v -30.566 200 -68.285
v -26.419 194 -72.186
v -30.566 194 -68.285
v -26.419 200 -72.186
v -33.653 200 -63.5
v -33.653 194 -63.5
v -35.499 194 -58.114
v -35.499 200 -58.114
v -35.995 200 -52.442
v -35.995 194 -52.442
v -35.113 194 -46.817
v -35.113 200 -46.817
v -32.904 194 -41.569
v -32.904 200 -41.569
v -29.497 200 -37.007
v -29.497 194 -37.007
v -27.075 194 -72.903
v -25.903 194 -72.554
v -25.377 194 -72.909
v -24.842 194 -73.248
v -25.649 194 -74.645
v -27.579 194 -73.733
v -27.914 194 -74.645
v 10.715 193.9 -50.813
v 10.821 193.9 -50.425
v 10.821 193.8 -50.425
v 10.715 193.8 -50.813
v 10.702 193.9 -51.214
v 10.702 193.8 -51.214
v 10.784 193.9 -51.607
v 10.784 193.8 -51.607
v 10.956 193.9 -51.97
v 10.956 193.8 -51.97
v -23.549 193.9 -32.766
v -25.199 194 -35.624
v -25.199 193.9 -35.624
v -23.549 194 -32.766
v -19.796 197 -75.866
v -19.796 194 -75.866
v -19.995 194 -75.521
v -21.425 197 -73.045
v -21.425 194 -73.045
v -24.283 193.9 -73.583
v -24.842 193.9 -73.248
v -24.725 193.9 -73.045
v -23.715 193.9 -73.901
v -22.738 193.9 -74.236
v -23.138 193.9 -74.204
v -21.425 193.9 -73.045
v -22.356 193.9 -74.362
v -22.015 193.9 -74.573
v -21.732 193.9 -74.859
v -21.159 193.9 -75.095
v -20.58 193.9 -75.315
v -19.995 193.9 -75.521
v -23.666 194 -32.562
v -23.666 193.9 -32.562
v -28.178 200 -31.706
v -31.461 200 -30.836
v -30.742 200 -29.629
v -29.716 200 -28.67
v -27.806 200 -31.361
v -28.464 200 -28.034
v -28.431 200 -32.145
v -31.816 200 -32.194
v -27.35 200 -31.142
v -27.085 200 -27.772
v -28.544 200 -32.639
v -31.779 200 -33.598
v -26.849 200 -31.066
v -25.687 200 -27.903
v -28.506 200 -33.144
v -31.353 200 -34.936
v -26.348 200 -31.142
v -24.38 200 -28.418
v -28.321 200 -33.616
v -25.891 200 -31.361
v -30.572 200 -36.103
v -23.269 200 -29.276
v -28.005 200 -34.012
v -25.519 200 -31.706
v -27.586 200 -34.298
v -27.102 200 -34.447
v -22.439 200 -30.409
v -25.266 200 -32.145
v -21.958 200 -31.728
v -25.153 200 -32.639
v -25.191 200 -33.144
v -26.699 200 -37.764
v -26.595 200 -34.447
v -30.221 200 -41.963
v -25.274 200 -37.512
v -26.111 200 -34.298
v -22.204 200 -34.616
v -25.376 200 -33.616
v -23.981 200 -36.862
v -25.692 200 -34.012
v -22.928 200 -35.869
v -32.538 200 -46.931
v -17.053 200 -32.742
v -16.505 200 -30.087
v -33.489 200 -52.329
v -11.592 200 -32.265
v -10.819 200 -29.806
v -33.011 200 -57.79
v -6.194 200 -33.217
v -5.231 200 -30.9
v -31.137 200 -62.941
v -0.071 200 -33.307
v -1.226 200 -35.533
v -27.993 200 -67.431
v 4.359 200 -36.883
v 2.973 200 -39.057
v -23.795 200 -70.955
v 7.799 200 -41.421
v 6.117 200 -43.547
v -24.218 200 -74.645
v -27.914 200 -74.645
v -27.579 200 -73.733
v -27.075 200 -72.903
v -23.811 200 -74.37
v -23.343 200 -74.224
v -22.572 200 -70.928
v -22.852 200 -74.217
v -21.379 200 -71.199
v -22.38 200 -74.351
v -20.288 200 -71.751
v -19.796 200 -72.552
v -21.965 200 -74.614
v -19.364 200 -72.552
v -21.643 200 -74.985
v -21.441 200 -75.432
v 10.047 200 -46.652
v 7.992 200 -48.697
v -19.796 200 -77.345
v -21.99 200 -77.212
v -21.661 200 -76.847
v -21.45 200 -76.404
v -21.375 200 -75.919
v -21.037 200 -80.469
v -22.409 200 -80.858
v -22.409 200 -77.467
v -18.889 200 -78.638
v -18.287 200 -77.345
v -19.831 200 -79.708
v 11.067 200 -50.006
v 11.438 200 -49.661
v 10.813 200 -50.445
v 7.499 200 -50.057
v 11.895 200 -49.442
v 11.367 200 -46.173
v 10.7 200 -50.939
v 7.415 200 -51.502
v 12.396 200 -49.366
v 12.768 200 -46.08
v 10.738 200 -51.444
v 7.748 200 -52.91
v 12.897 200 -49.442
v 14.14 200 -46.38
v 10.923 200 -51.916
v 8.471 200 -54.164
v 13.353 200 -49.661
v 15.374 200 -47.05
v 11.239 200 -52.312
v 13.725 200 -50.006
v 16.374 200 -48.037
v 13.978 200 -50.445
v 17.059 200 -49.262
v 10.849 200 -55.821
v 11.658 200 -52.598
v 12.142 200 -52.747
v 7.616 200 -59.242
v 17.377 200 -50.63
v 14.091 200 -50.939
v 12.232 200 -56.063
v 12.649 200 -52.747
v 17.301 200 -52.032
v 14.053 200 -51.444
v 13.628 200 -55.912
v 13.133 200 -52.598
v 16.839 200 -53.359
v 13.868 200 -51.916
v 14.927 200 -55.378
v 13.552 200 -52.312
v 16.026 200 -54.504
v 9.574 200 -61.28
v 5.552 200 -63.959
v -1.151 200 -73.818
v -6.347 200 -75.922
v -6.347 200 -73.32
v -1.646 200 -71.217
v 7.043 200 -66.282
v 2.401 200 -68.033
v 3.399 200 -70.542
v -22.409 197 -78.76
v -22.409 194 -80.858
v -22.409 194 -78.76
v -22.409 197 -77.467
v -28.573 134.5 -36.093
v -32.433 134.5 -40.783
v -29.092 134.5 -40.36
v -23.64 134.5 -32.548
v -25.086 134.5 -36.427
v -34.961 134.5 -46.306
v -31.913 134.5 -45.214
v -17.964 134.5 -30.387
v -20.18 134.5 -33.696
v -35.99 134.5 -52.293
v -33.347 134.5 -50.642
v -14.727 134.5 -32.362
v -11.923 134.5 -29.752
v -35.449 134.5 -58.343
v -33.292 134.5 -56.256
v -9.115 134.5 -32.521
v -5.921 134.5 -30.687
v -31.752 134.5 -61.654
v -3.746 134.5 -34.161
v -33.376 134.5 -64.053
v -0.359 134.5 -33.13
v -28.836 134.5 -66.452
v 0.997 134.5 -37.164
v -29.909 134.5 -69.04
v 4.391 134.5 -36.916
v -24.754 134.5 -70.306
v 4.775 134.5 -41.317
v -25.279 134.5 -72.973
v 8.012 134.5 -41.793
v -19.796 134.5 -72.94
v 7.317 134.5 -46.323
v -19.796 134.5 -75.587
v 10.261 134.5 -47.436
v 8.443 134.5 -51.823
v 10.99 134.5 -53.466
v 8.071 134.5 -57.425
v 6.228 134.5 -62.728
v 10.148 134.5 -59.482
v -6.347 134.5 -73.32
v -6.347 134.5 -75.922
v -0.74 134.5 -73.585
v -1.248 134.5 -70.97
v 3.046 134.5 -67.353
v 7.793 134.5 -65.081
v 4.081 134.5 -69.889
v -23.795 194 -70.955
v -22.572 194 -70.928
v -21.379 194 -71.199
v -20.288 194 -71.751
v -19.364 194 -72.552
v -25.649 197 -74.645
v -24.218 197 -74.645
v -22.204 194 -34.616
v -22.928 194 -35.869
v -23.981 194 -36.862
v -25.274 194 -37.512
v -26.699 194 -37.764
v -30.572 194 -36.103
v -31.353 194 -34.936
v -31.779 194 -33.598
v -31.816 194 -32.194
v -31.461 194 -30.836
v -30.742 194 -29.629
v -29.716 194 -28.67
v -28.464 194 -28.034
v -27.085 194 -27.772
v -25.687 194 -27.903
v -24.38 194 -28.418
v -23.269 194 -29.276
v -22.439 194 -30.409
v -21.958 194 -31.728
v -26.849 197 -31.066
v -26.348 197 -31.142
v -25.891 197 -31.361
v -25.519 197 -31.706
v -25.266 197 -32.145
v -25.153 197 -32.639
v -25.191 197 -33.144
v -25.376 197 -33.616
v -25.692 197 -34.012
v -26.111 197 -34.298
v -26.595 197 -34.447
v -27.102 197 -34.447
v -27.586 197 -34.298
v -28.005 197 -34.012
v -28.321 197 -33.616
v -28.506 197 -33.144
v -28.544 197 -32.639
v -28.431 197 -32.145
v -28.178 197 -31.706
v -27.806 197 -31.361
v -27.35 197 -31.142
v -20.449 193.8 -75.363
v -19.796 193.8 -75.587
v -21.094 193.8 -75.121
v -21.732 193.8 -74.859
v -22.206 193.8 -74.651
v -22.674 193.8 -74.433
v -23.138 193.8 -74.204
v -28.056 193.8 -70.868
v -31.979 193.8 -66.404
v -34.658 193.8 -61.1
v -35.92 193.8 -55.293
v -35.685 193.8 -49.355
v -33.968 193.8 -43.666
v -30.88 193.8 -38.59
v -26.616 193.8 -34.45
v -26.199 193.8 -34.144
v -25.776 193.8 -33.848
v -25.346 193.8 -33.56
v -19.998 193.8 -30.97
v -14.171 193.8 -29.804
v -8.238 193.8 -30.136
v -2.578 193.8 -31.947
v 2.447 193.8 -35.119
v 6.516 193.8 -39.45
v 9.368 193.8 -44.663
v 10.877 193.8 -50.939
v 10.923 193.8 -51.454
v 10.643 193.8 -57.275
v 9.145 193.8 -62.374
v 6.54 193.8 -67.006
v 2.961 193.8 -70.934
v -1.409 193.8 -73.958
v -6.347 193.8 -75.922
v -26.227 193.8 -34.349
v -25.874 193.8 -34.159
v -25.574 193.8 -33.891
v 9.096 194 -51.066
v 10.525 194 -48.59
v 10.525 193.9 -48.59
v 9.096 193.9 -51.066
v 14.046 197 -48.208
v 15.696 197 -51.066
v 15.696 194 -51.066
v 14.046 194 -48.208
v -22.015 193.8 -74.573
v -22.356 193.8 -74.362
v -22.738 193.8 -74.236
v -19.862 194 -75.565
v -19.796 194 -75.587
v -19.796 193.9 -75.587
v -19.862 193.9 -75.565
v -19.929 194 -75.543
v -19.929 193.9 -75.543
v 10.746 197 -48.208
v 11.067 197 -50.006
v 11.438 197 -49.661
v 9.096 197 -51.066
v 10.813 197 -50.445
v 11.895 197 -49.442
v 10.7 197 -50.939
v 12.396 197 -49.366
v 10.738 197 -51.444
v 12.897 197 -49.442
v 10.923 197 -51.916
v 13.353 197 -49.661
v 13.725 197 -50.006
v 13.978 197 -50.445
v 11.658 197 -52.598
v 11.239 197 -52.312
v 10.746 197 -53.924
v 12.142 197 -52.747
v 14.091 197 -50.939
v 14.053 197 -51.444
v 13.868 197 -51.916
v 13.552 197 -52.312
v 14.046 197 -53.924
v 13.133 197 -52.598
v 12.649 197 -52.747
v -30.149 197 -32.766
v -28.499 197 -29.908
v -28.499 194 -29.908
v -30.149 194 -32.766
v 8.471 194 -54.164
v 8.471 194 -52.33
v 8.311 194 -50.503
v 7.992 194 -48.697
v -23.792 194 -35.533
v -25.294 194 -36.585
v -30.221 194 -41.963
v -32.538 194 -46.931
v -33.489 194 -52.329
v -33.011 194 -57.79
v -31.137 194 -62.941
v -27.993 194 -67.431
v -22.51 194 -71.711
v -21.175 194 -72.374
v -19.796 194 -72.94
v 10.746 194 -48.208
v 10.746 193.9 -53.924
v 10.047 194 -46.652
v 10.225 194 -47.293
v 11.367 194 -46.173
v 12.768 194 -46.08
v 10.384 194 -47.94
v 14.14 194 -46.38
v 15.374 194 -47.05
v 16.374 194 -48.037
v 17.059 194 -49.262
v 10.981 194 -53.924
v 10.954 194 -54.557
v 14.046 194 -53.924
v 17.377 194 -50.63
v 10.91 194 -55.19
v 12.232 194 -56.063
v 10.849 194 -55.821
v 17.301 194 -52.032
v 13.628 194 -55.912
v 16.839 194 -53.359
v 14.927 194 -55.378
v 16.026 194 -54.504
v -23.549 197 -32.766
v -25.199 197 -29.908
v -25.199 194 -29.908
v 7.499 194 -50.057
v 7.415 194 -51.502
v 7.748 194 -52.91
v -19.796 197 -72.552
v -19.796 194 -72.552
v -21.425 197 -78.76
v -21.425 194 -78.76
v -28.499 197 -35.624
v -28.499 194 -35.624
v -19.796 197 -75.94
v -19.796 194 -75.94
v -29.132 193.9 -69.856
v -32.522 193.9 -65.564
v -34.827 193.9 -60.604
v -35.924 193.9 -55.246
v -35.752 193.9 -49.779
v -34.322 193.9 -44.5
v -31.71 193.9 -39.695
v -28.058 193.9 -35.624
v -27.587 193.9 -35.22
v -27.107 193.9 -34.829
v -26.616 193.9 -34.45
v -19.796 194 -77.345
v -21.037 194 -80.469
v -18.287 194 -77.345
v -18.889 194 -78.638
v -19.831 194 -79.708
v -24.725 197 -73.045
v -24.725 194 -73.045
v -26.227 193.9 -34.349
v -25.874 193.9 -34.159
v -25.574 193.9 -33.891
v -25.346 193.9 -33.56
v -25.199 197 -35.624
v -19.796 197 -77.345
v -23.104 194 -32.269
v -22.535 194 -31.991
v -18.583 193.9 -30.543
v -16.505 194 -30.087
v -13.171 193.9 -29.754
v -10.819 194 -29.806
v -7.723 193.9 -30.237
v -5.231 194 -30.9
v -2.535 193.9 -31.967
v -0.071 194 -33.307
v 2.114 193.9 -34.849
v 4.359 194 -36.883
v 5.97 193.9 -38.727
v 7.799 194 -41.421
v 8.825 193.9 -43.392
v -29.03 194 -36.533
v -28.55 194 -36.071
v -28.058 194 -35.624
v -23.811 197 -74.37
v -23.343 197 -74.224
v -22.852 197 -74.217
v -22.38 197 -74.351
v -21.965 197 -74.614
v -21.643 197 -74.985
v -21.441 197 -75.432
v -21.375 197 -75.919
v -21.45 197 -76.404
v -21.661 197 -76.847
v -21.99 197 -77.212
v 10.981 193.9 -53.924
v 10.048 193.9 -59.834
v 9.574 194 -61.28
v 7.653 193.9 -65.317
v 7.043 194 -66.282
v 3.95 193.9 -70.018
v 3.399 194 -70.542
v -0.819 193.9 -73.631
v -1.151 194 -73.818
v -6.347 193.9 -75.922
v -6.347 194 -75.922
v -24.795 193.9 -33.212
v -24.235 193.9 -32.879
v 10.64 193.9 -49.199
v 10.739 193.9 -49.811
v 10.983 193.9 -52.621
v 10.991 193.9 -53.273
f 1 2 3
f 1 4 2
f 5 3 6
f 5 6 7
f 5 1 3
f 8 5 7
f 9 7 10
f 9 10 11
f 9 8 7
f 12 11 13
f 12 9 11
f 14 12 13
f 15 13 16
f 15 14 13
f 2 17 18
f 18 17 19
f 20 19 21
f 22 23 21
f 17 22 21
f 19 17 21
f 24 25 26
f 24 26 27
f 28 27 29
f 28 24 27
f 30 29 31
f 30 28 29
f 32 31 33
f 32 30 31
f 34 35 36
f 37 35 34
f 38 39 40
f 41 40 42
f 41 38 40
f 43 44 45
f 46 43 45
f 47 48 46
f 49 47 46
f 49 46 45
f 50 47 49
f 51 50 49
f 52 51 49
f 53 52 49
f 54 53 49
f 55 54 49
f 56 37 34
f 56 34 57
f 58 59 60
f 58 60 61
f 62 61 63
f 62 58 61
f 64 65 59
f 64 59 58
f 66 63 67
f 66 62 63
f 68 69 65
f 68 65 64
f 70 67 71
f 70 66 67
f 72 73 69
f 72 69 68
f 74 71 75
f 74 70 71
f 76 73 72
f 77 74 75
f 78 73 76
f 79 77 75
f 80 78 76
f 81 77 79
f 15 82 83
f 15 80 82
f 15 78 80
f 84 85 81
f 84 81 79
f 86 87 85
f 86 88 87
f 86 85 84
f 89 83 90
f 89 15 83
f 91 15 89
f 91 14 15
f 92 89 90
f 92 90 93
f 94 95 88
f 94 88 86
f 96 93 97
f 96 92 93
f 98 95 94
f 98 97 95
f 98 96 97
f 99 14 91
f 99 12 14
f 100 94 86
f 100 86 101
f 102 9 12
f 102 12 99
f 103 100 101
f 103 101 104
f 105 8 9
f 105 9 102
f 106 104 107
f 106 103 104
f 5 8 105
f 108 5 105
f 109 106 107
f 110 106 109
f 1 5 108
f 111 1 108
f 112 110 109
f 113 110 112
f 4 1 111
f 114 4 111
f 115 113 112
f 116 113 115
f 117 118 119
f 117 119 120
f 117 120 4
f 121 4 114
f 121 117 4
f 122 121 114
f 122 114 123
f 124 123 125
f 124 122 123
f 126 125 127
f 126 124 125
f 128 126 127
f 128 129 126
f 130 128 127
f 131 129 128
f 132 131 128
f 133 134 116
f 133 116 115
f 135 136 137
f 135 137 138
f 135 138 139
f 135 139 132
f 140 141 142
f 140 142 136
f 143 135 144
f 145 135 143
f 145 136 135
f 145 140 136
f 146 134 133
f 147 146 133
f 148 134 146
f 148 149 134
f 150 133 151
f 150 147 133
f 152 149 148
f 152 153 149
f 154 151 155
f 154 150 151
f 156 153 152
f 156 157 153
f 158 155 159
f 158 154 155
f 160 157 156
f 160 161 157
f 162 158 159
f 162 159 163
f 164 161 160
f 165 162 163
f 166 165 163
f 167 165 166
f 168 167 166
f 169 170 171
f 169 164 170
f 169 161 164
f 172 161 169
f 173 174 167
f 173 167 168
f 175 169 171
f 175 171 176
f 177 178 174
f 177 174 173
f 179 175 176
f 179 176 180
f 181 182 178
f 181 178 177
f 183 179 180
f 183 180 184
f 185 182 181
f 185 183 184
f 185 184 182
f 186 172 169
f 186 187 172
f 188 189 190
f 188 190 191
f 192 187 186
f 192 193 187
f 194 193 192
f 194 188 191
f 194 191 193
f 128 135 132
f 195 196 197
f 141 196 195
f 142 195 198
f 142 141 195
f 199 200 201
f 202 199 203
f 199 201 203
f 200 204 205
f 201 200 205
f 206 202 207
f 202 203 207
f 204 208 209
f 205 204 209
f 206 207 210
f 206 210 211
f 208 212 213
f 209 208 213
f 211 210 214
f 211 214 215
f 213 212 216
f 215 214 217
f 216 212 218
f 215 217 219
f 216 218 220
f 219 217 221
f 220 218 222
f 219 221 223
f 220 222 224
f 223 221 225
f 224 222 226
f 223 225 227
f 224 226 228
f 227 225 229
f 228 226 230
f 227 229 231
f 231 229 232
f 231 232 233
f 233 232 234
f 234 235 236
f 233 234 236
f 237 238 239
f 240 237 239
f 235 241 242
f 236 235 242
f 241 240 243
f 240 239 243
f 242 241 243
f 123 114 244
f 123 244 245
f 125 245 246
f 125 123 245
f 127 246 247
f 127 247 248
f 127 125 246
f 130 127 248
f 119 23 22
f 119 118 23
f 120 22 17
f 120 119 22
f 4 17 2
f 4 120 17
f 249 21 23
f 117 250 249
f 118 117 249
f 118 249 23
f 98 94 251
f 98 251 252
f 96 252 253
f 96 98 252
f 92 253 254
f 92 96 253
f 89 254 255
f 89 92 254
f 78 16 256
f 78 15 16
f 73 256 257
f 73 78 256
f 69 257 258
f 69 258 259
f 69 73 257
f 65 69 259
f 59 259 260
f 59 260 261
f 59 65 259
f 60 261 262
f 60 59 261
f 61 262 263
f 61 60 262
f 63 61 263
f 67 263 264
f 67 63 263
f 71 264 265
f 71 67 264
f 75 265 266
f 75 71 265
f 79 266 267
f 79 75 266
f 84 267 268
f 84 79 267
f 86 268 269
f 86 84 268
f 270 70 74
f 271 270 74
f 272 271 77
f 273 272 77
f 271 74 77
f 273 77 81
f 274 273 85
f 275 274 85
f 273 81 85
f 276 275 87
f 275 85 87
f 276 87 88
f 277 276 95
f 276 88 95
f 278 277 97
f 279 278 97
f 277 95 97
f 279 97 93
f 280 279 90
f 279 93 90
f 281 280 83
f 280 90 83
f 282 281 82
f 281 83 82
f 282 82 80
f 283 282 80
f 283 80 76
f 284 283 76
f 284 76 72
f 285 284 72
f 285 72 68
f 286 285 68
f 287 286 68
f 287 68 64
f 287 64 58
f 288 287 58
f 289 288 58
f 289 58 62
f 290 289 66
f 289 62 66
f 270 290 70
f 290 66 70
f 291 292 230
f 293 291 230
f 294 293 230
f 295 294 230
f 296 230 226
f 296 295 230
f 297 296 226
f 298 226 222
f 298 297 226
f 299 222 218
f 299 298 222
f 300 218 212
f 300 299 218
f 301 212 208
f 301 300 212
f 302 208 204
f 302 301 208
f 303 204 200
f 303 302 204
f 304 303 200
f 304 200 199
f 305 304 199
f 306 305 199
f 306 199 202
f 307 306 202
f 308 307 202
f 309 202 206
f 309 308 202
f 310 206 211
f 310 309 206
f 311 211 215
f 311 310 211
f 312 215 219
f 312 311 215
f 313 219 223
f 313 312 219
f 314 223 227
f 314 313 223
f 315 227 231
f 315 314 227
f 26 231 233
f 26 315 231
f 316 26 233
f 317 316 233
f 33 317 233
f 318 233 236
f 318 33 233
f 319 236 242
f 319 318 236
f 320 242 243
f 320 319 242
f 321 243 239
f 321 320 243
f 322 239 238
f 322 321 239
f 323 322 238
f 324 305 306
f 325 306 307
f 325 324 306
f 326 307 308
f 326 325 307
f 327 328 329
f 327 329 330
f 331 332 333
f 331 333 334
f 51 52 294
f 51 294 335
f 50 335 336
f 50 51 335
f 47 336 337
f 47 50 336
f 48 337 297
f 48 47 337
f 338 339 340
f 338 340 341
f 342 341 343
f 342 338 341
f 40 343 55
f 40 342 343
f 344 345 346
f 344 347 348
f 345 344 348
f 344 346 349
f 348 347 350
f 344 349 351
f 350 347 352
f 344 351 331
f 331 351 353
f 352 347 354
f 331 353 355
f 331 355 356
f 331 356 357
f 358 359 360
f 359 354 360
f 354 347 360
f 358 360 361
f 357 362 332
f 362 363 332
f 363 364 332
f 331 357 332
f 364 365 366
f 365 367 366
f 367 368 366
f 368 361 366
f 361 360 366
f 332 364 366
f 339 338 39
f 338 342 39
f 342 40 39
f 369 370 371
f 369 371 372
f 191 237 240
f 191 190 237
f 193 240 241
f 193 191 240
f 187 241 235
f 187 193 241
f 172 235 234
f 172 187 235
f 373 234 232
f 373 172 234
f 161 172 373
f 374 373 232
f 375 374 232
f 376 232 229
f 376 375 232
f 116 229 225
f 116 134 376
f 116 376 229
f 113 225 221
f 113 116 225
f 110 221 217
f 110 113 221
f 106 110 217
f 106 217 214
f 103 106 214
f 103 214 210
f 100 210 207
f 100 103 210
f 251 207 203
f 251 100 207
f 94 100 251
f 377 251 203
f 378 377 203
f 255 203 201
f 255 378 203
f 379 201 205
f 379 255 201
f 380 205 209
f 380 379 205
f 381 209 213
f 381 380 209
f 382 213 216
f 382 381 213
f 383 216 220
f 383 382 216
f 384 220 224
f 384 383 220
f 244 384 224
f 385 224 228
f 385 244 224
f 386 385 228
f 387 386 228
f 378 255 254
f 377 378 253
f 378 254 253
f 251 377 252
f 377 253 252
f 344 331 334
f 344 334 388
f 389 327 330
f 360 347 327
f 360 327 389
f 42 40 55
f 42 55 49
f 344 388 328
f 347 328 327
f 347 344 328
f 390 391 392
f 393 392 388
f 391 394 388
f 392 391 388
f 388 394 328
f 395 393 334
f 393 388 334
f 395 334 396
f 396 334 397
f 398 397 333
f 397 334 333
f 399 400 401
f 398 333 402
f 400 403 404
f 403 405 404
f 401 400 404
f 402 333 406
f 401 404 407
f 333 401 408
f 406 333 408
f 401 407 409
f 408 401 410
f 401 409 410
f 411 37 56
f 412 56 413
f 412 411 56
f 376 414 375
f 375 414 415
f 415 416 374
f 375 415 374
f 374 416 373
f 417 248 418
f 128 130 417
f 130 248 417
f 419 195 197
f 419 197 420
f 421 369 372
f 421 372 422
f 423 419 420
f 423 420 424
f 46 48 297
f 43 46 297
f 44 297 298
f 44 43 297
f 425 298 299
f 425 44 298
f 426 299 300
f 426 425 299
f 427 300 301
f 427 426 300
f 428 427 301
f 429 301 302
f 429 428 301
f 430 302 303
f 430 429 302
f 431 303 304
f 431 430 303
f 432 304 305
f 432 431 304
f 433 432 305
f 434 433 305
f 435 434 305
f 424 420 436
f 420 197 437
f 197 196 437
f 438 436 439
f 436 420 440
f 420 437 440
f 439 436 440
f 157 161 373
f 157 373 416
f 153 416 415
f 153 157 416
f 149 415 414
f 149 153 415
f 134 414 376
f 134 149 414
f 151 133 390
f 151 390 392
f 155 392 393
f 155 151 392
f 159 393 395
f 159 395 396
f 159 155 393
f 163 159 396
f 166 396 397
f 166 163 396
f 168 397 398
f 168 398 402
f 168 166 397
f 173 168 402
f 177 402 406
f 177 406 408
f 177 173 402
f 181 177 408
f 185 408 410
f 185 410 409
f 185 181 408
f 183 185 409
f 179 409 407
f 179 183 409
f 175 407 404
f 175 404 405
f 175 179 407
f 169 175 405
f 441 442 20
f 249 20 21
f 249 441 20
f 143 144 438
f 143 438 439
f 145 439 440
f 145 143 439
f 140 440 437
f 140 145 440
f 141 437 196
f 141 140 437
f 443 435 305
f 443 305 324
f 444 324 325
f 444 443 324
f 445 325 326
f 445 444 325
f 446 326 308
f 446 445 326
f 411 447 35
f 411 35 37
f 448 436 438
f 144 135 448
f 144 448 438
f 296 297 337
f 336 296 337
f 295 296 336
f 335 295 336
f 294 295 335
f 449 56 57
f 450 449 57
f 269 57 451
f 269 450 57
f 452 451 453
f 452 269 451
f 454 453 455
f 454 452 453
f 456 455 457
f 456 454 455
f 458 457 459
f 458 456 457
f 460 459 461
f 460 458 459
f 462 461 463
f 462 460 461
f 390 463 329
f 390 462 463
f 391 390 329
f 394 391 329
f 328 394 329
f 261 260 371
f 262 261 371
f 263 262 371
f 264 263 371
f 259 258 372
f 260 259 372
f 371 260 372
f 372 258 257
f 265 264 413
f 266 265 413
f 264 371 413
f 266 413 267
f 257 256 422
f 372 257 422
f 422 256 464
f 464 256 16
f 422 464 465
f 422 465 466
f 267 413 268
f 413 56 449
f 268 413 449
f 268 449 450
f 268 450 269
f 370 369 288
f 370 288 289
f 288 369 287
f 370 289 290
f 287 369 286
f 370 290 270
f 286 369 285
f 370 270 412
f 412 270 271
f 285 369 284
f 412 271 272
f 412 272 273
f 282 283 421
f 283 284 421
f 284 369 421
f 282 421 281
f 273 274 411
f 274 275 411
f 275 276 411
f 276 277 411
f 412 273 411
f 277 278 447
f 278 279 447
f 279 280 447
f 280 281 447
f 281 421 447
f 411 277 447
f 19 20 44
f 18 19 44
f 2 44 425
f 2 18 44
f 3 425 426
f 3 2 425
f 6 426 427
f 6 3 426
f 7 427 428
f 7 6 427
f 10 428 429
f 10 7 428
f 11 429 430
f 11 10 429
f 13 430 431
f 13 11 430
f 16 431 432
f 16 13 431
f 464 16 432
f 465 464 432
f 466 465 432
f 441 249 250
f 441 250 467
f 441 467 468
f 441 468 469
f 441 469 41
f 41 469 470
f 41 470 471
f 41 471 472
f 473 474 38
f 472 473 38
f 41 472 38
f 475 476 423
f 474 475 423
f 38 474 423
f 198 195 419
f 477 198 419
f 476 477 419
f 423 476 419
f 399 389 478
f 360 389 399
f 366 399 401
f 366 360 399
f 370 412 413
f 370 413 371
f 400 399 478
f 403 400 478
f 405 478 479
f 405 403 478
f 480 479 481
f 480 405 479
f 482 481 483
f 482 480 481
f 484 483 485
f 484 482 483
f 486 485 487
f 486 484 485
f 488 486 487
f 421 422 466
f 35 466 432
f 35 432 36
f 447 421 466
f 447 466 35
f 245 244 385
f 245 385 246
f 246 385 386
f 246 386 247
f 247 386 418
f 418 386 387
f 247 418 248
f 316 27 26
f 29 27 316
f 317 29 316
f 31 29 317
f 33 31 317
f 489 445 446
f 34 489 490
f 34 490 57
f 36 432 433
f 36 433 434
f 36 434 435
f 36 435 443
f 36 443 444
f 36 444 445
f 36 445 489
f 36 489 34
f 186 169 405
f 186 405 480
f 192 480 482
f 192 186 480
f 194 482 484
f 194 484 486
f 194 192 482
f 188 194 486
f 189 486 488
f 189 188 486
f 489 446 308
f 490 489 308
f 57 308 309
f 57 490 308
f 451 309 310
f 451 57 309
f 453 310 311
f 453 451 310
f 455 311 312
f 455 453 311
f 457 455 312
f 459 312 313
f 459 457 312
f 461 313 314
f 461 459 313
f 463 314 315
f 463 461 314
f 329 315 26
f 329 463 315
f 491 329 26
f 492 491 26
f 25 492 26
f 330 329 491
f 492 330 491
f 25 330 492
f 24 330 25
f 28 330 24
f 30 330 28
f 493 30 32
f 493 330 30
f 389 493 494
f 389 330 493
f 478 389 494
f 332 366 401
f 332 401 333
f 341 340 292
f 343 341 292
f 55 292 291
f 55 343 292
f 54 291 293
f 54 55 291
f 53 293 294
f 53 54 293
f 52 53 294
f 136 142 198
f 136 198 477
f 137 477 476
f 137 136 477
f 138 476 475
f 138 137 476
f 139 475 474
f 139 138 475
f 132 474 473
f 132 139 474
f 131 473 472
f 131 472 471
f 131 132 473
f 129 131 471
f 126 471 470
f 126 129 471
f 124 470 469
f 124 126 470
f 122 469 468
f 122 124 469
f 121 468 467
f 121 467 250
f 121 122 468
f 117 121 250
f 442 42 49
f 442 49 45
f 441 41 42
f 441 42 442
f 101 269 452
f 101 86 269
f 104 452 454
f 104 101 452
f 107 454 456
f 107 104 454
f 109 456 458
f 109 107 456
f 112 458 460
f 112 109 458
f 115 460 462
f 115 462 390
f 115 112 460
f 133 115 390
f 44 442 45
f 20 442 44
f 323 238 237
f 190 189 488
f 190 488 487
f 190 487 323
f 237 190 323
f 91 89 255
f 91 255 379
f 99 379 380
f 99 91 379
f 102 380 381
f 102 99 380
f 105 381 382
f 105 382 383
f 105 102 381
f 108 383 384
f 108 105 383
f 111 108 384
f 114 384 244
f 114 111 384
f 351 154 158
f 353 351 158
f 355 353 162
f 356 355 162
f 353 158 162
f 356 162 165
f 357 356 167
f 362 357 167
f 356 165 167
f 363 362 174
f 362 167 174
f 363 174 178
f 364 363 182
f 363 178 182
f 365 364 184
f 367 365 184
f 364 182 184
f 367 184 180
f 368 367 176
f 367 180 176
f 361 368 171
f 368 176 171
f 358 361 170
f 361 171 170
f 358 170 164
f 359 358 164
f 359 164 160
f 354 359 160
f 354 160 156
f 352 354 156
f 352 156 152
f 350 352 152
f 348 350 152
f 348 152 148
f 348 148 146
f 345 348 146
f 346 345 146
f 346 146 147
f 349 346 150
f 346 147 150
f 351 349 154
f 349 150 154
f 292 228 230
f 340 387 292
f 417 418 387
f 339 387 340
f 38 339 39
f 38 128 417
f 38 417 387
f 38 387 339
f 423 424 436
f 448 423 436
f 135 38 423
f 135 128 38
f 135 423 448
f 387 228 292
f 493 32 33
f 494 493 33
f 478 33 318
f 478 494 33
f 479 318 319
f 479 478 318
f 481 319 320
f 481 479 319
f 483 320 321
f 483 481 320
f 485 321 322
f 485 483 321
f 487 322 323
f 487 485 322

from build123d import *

# Parameters (mm, degrees)
WHEEL_SUPPORT_RAILS_1_PROFILE_R       = 1.7
WHEEL_SUPPORT_RAILS_1_EXTRUSION_DEPTH = 3
WHEEL_SUPPORT_RAILS_2_EXTRUSION_DEPTH = 3
WHEEL_SUPPORT_RAILS_3_EXTRUSION_DEPTH = 0.1
WHEEL_SUPPORT_RAILS_4_EXTRUSION_DEPTH = 0.1
PIVOT_BACKING_5_EXTRUSION_DEPTH       = 59.3


with BuildPart() as part:
    # Wheel support rails 1 profile → Wheel support rails 1 extrusion (new body)
    with BuildSketch(Plane(origin=(0, -200, 0), x_dir=(1, 0, 0), z_dir=(0, 1, 0))):
        with BuildLine():
            Line((-19.3635199, 72.551817663), (-19.796031534, 72.551817663))
            Line((-19.796031534, 72.551817663), (-19.796031534, 77.344882879))
            Line((-19.796031534, 77.344882879), (-18.287181296, 77.344882879))
            ThreePointArc((-18.287181296, 77.344882879), (-19.831302101, 79.707937327), (-22.409182889, 80.858096458))
            Line((-22.409182889, 80.858096458), (-22.409182889, 77.466920099))
            ThreePointArc((-22.409182889, 77.466920099), (-21.643496924, 74.985063993), (-24.218406931, 74.644882879))
            Line((-24.218406931, 74.644882879), (-27.913875328, 74.644882879))
            ThreePointArc((-27.913875328, 74.644882879), (-27.347266001, 73.305528815), (-26.419206918, 72.185876289))
            ThreePointArc((-26.419206918, 72.185876289), (-35.919758288, 55.293042834), (-29.496951386, 37.007096044))
            ThreePointArc((-29.496951386, 37.007096044), (-29.716475974, 28.670321551), (-21.957552332, 31.727951993))
            ThreePointArc((-21.957552332, 31.727951993), (-2.577653733, 31.946649884), (10.047037269, 46.651937219))
            ThreePointArc((10.047037269, 46.651937219), (17.37665806, 50.630210597), (10.849210599, 55.820820355))
            ThreePointArc((10.849210599, 55.820820355), (5.348356993, 68.520951403), (-6.346539744, 75.922445127))
            Line((-6.346539744, 75.922445127), (-6.346539744, 73.320286475))
            ThreePointArc((-6.346539744, 73.320286475), (4.101805551, 66.093036958), (8.470715341, 54.163507116))
            ThreePointArc((8.470715341, 54.163507116), (7.414711079, 51.501768024), (7.992466121, 48.697093513))
            ThreePointArc((7.992466121, 48.697093513), (-3.634199387, 34.212419351), (-22.203580069, 34.616445929))
            ThreePointArc((-22.203580069, 34.616445929), (-23.98071161, 36.861841994), (-26.698508507, 37.763828705))
            ThreePointArc((-26.698508507, 37.763828705), (-33.429271543, 55.075153477), (-23.794683922, 70.954695591))
            ThreePointArc((-23.794683922, 70.954695591), (-21.379253869, 71.198784638), (-19.3635199, 72.551817663))
        make_face()
        with Locations((12.395684569, 51.06598931)):
            Circle(WHEEL_SUPPORT_RAILS_1_PROFILE_R, mode=Mode.SUBTRACT)
        with Locations((-26.848593792, 32.766081772)):
            Circle(WHEEL_SUPPORT_RAILS_1_PROFILE_R, mode=Mode.SUBTRACT)
    extrude(amount=WHEEL_SUPPORT_RAILS_1_EXTRUSION_DEPTH)

    # Wheel support rails 2 profile → Wheel support rails 2 extrusion (add)
    # profile 1 of 2: a face of its own
    with BuildSketch(Plane(origin=(0, -197, 0), x_dir=(1, 0, 0), z_dir=(0, 1, 0))):
        with BuildLine():
            Line((-19.3635199, 72.551817663), (-19.796031533, 72.551817663))
            Line((-19.796031533, 72.551817663), (-19.796031533, 75.86552534))
            Line((-19.796031533, 75.86552534), (-21.424639427, 73.044693722))
            Line((-21.424639427, 73.044693722), (-24.724639427, 73.044693722))
            Line((-24.724639427, 73.044693722), (-25.648509068, 74.644882879))
            Line((-25.648509068, 74.644882879), (-27.913875328, 74.644882879))
            ThreePointArc((-27.913875328, 74.644882879), (-27.347266001, 73.305528815), (-26.419206918, 72.185876289))
            ThreePointArc((-26.419206918, 72.185876289), (-35.919758288, 55.293042834), (-29.496951386, 37.007096044))
            ThreePointArc((-29.496951386, 37.007096044), (-29.716475974, 28.670321551), (-21.957552332, 31.727951993))
            ThreePointArc((-21.957552332, 31.727951993), (-2.577653733, 31.946649884), (10.047037269, 46.651937219))
            ThreePointArc((10.047037269, 46.651937219), (17.37665806, 50.630210597), (10.849210599, 55.820820355))
            ThreePointArc((10.849210599, 55.820820355), (5.348356993, 68.520951403), (-6.346539744, 75.922445127))
            Line((-6.346539744, 75.922445127), (-6.346539744, 73.320286475))
            ThreePointArc((-6.346539744, 73.320286475), (4.101805551, 66.093036958), (8.470715341, 54.163507116))
            ThreePointArc((8.470715341, 54.163507116), (7.414711079, 51.501768024), (7.992466121, 48.697093513))
            ThreePointArc((7.992466121, 48.697093513), (-3.634199387, 34.212419351), (-22.203580069, 34.616445929))
            ThreePointArc((-22.203580069, 34.616445929), (-23.98071161, 36.861841994), (-26.698508507, 37.763828705))
            ThreePointArc((-26.698508507, 37.763828705), (-33.429271543, 55.075153477), (-23.794683922, 70.954695591))
            ThreePointArc((-23.794683922, 70.954695591), (-21.379253869, 71.198784638), (-19.3635199, 72.551817663))
        make_face()
        Polygon((9.095684569, 51.06598931), (10.745684569, 53.923873143), (14.045684569, 53.923873143), (15.695684569, 51.06598931), (14.045684569, 48.208105478), (10.745684569, 48.208105478), align=None, mode=Mode.SUBTRACT)
        Polygon((-30.148593792, 32.766081772), (-28.498593792, 35.623965604), (-25.198593792, 35.623965604), (-23.548593792, 32.766081772), (-25.198593792, 29.908197939), (-28.498593792, 29.908197939), align=None, mode=Mode.SUBTRACT)
    # profile 2 of 2: a face of its own
    with BuildSketch(Plane(origin=(0, -197, 0), x_dir=(1, 0, 0), z_dir=(0, 1, 0))):
        with BuildLine():
            Line((-22.409182889, 78.760461387), (-21.424639427, 78.760461387))
            Line((-21.424639427, 78.760461387), (-19.796031533, 75.939629769))
            Line((-19.796031533, 75.939629769), (-19.796031533, 77.344882879))
            Line((-19.796031533, 77.344882879), (-18.287181296, 77.344882879))
            ThreePointArc((-18.287181296, 77.344882879), (-19.831302101, 79.707937327), (-22.409182889, 80.858096458))
            Line((-22.409182889, 80.858096458), (-22.409182889, 78.760461387))
        make_face()
    extrude(amount=WHEEL_SUPPORT_RAILS_2_EXTRUSION_DEPTH)

    # Wheel support rails 3 profile → Wheel support rails 3 extrusion (add)
    with BuildSketch(Plane(origin=(0, -194, 0), x_dir=(1, 0, 0), z_dir=(0, 1, 0))):
        with BuildLine():
            Line((9.095684569, 51.06598931), (10.745684569, 53.923873143))
            Line((10.745684569, 53.923873143), (10.981005967, 53.923873143))
            ThreePointArc((10.981005967, 53.923873143), (5.95177331, 67.785965934), (-6.346539744, 75.922445127))
            Line((-6.346539744, 75.922445127), (-6.346539744, 73.320286475))
            ThreePointArc((-6.346539744, 73.320286475), (-11.915808048, 32.253267736), (-19.796031533, 72.940106583))
            Line((-19.796031533, 72.940106583), (-19.796031533, 75.586589097))
            ThreePointArc((-19.796031533, 75.586589097), (-19.895657477, 75.553849531), (-19.99513633, 75.520665715))
            Line((-19.99513633, 75.520665715), (-21.424639427, 73.044693721))
            Line((-21.424639427, 73.044693721), (-24.724639427, 73.044693721))
            Line((-24.724639427, 73.044693721), (-24.842300126, 73.24848803))
            ThreePointArc((-24.842300126, 73.24848803), (-35.923839859, 55.245842318), (-28.057599985, 35.623965605))
            Line((-28.057599985, 35.623965605), (-25.198593791, 35.623965605))
            Line((-25.198593791, 35.623965605), (-23.548593792, 32.766081772))
            Line((-23.548593792, 32.766081772), (-23.666254491, 32.562287463))
            ThreePointArc((-23.666254491, 32.562287463), (-2.534736101, 31.966715397), (10.525187666, 48.590017317))
            Line((10.525187666, 48.590017317), (9.095684569, 51.06598931))
        make_face()
    extrude(amount=WHEEL_SUPPORT_RAILS_3_EXTRUSION_DEPTH)

    # Wheel support rails 4 profile → Wheel support rails 4 extrusion (add)
    with BuildSketch(Plane(origin=(0, -193.9, 0), x_dir=(1, 0, 0), z_dir=(0, 1, 0))):
        with BuildLine():
            Line((-6.346539744, 75.922445127), (-6.346539744, 73.320286475))
            ThreePointArc((-6.346539744, 73.320286475), (-11.915808048, 32.253267736), (-19.796031533, 72.940106583))
            Line((-19.796031533, 72.940106583), (-19.796031533, 75.586589097))
            ThreePointArc((-19.796031533, 75.586589097), (-20.77224205, 75.244243169), (-21.732439848, 74.859265381))
            ThreePointArc((-21.732439848, 74.859265381), (-22.356188381, 74.361854317), (-23.138165192, 74.203764887))
            ThreePointArc((-23.138165192, 74.203764887), (-35.919758287, 55.293042834), (-26.616158734, 34.450116791))
            ThreePointArc((-26.616158734, 34.450116791), (-25.873513849, 34.158640248), (-25.345615983, 33.560473178))
            ThreePointArc((-25.345615983, 33.560473178), (-2.577653732, 31.946649884), (10.821049933, 50.425266465))
            ThreePointArc((10.821049933, 50.425266465), (10.702153582, 51.214154072), (10.956232526, 51.97041057))
            ThreePointArc((10.956232526, 51.97041057), (6.540238452, 67.006043687), (-6.346539744, 75.922445127))
        make_face()
    extrude(amount=WHEEL_SUPPORT_RAILS_4_EXTRUSION_DEPTH)

    # Pivot backing 5 profile → Pivot backing 5 extrusion (add)
    with BuildSketch(Plane(origin=(0, -193.8, 0), x_dir=(1, 0, 0), z_dir=(0, 1, 0))):
        with BuildLine():
            Line((-6.346539744, 75.922445127), (-6.346539744, 73.320286475))
            ThreePointArc((-6.346539744, 73.320286475), (-11.915808048, 32.253267736), (-19.796031533, 72.940106583))
            Line((-19.796031533, 72.940106583), (-19.796031533, 75.586589097))
            ThreePointArc((-19.796031533, 75.586589097), (-11.922531942, 29.752206559), (-6.346539744, 75.922445127))
        make_face()
    extrude(amount=PIVOT_BACKING_5_EXTRUSION_DEPTH)


with BuildPart() as body_2:
    # Mirror1: mirrored copy
    add(part.part.mirror(Plane(origin=(0, 0, 0), x_dir=(0, 0, 1), z_dir=(0, -1, 0))))


solid = body_2.part
